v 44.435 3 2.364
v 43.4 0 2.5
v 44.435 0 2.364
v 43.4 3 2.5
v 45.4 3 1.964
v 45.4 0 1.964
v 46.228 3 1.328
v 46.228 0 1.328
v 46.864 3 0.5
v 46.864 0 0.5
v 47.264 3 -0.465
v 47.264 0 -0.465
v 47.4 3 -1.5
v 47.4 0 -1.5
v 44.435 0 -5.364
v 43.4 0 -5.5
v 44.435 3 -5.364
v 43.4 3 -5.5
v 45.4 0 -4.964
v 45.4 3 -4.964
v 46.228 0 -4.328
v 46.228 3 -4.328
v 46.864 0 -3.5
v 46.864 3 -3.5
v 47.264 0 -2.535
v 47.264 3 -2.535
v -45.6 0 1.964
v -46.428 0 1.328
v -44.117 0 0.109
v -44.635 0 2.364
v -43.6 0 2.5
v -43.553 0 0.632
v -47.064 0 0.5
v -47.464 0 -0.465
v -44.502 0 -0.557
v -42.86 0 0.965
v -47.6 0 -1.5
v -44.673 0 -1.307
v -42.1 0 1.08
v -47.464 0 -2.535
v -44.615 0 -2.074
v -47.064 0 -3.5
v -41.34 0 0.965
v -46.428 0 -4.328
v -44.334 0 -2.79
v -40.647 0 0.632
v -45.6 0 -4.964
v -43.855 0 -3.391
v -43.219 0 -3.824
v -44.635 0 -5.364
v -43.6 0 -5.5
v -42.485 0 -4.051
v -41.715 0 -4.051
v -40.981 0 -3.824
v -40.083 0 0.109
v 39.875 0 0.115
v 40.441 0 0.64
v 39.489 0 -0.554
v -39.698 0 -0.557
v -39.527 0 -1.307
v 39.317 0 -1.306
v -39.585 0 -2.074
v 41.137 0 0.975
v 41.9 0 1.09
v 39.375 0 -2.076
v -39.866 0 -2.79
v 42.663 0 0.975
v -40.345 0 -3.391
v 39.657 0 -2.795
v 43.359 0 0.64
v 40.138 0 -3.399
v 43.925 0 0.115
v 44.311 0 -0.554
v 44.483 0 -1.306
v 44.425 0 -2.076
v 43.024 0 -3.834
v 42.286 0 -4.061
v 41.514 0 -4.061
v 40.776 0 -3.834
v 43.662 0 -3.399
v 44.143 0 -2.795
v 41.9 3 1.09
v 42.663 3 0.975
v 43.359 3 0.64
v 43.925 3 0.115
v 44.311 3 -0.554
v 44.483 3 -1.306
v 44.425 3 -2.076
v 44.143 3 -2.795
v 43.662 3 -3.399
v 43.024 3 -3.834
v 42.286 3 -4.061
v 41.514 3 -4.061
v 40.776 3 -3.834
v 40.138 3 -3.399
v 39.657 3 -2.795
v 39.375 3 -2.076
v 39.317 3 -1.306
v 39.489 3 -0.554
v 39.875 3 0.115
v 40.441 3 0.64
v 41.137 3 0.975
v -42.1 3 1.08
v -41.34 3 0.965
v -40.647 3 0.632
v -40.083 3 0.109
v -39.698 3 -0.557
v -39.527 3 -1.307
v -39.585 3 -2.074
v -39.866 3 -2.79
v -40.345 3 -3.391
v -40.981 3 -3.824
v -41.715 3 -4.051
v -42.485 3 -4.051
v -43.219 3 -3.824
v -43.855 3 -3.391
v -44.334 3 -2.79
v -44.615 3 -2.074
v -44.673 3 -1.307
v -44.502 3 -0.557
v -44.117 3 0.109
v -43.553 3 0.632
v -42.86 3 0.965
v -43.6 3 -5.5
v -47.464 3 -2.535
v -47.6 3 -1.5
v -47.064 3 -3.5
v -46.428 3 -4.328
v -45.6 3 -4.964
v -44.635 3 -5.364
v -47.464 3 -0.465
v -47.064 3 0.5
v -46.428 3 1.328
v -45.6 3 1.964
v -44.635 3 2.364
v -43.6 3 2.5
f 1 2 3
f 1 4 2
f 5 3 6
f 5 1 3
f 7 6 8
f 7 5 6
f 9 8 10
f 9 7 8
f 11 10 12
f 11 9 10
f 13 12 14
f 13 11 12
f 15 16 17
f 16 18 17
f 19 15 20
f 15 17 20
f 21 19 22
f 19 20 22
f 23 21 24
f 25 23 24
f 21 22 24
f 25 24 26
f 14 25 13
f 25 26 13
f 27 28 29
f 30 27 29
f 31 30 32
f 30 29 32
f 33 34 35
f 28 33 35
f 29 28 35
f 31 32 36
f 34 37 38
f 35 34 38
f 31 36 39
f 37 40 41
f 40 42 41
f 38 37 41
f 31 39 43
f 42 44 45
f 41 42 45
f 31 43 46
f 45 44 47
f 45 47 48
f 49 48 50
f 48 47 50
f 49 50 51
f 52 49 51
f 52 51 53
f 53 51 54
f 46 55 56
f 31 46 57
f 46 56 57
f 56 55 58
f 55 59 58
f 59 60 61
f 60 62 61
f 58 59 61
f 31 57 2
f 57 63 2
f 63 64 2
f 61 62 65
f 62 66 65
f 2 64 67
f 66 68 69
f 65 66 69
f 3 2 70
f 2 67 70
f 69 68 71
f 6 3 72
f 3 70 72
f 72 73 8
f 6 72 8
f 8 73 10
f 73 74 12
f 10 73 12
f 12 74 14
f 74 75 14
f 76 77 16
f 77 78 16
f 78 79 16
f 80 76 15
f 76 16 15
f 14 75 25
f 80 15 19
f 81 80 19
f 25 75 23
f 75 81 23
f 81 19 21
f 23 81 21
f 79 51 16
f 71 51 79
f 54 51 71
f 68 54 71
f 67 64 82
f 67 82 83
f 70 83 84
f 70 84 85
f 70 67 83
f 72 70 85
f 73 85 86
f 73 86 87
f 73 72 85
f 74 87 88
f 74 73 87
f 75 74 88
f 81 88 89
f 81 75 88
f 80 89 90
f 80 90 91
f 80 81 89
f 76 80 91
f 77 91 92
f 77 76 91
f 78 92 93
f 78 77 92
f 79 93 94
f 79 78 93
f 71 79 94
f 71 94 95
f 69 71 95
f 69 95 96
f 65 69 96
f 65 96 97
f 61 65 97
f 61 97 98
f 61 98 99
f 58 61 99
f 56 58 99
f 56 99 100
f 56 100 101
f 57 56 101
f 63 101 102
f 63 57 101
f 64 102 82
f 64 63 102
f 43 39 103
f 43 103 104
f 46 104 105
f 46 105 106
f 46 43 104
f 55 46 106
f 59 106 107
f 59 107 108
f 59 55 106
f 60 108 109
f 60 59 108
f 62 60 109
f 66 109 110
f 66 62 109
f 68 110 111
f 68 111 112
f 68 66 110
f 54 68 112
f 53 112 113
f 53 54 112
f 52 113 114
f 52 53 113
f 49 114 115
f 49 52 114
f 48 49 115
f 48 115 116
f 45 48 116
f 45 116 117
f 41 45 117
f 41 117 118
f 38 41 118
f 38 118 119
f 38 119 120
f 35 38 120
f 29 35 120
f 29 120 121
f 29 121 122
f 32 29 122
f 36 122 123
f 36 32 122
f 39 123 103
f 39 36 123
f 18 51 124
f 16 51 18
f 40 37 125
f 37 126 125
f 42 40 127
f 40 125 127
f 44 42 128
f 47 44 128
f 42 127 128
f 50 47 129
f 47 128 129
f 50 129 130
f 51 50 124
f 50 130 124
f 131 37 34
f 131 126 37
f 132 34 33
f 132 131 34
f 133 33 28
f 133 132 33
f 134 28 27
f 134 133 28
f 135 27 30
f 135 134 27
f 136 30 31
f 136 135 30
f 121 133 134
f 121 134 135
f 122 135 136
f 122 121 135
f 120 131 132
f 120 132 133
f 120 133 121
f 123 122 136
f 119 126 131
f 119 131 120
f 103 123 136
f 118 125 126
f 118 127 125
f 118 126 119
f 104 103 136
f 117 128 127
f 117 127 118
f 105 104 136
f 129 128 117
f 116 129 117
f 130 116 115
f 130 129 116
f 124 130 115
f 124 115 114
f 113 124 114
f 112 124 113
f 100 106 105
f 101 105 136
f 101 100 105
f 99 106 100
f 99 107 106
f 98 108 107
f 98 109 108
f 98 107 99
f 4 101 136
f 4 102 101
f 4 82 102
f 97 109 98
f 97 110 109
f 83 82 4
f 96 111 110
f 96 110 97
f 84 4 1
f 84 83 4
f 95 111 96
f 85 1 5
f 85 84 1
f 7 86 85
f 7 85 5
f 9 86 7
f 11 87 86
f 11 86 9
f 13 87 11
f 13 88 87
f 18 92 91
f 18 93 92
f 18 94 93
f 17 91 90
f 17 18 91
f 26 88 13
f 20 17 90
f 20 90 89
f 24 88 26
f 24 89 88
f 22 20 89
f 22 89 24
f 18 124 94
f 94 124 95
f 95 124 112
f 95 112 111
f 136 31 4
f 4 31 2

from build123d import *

# Parameters (mm, degrees)
SKETCH1_W           = 95
SKETCH1_H           = 8
SKETCH1_R           = 2.58
SKETCH1_R_2         = 2.59
BOSS_EXTRUDE1_DEPTH = 3
REDONDEO2_R         = 4


with BuildPart() as part:
    # Sketch1 → Boss-Extrude1 (new body)
    with BuildSketch(Plane(origin=(0, 0, 0), x_dir=(1, 0, 0), z_dir=(0, 1, 0))):
        with Locations((-0.1, 1.5)):
            Rectangle(SKETCH1_W, SKETCH1_H)
        with Locations(Location((-42.1, 1.5, 0), (0, 0, 270))):
            Circle(SKETCH1_R, mode=Mode.SUBTRACT)
        with Locations(Location((41.9, 1.5, 0), (0, 0, 270))):
            Circle(SKETCH1_R_2, mode=Mode.SUBTRACT)
    extrude(amount=BOSS_EXTRUDE1_DEPTH)

    # Redondeo2
    redondeo2_edges = [part.edges().sort_by_distance(p)[0] for p in [
        (47.4, 1.5, -5.5),
        (47.4, 1.5, 2.5),
        (-47.6, 1.5, -5.5),
        (-47.6, 1.5, 2.5),
    ]]
    fillet(redondeo2_edges, radius=REDONDEO2_R - 0.0001)  # a hair under: the kernel refuses the full size


solid = part.part
